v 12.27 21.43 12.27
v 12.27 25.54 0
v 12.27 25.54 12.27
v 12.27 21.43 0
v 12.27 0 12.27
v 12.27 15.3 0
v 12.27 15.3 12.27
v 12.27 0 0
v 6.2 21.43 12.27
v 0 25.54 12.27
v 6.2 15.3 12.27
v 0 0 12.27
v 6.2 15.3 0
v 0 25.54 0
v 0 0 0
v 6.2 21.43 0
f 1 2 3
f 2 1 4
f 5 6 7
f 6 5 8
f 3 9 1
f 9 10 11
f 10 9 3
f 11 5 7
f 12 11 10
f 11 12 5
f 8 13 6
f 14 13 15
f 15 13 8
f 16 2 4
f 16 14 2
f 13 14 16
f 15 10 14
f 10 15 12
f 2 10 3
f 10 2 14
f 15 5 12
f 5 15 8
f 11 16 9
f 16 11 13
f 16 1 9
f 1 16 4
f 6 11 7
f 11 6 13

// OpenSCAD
difference() {
cube([12.27,25.54,12.27]);
translate([6.2,15.3,0])cube([6.13,6.13,50]);
}
